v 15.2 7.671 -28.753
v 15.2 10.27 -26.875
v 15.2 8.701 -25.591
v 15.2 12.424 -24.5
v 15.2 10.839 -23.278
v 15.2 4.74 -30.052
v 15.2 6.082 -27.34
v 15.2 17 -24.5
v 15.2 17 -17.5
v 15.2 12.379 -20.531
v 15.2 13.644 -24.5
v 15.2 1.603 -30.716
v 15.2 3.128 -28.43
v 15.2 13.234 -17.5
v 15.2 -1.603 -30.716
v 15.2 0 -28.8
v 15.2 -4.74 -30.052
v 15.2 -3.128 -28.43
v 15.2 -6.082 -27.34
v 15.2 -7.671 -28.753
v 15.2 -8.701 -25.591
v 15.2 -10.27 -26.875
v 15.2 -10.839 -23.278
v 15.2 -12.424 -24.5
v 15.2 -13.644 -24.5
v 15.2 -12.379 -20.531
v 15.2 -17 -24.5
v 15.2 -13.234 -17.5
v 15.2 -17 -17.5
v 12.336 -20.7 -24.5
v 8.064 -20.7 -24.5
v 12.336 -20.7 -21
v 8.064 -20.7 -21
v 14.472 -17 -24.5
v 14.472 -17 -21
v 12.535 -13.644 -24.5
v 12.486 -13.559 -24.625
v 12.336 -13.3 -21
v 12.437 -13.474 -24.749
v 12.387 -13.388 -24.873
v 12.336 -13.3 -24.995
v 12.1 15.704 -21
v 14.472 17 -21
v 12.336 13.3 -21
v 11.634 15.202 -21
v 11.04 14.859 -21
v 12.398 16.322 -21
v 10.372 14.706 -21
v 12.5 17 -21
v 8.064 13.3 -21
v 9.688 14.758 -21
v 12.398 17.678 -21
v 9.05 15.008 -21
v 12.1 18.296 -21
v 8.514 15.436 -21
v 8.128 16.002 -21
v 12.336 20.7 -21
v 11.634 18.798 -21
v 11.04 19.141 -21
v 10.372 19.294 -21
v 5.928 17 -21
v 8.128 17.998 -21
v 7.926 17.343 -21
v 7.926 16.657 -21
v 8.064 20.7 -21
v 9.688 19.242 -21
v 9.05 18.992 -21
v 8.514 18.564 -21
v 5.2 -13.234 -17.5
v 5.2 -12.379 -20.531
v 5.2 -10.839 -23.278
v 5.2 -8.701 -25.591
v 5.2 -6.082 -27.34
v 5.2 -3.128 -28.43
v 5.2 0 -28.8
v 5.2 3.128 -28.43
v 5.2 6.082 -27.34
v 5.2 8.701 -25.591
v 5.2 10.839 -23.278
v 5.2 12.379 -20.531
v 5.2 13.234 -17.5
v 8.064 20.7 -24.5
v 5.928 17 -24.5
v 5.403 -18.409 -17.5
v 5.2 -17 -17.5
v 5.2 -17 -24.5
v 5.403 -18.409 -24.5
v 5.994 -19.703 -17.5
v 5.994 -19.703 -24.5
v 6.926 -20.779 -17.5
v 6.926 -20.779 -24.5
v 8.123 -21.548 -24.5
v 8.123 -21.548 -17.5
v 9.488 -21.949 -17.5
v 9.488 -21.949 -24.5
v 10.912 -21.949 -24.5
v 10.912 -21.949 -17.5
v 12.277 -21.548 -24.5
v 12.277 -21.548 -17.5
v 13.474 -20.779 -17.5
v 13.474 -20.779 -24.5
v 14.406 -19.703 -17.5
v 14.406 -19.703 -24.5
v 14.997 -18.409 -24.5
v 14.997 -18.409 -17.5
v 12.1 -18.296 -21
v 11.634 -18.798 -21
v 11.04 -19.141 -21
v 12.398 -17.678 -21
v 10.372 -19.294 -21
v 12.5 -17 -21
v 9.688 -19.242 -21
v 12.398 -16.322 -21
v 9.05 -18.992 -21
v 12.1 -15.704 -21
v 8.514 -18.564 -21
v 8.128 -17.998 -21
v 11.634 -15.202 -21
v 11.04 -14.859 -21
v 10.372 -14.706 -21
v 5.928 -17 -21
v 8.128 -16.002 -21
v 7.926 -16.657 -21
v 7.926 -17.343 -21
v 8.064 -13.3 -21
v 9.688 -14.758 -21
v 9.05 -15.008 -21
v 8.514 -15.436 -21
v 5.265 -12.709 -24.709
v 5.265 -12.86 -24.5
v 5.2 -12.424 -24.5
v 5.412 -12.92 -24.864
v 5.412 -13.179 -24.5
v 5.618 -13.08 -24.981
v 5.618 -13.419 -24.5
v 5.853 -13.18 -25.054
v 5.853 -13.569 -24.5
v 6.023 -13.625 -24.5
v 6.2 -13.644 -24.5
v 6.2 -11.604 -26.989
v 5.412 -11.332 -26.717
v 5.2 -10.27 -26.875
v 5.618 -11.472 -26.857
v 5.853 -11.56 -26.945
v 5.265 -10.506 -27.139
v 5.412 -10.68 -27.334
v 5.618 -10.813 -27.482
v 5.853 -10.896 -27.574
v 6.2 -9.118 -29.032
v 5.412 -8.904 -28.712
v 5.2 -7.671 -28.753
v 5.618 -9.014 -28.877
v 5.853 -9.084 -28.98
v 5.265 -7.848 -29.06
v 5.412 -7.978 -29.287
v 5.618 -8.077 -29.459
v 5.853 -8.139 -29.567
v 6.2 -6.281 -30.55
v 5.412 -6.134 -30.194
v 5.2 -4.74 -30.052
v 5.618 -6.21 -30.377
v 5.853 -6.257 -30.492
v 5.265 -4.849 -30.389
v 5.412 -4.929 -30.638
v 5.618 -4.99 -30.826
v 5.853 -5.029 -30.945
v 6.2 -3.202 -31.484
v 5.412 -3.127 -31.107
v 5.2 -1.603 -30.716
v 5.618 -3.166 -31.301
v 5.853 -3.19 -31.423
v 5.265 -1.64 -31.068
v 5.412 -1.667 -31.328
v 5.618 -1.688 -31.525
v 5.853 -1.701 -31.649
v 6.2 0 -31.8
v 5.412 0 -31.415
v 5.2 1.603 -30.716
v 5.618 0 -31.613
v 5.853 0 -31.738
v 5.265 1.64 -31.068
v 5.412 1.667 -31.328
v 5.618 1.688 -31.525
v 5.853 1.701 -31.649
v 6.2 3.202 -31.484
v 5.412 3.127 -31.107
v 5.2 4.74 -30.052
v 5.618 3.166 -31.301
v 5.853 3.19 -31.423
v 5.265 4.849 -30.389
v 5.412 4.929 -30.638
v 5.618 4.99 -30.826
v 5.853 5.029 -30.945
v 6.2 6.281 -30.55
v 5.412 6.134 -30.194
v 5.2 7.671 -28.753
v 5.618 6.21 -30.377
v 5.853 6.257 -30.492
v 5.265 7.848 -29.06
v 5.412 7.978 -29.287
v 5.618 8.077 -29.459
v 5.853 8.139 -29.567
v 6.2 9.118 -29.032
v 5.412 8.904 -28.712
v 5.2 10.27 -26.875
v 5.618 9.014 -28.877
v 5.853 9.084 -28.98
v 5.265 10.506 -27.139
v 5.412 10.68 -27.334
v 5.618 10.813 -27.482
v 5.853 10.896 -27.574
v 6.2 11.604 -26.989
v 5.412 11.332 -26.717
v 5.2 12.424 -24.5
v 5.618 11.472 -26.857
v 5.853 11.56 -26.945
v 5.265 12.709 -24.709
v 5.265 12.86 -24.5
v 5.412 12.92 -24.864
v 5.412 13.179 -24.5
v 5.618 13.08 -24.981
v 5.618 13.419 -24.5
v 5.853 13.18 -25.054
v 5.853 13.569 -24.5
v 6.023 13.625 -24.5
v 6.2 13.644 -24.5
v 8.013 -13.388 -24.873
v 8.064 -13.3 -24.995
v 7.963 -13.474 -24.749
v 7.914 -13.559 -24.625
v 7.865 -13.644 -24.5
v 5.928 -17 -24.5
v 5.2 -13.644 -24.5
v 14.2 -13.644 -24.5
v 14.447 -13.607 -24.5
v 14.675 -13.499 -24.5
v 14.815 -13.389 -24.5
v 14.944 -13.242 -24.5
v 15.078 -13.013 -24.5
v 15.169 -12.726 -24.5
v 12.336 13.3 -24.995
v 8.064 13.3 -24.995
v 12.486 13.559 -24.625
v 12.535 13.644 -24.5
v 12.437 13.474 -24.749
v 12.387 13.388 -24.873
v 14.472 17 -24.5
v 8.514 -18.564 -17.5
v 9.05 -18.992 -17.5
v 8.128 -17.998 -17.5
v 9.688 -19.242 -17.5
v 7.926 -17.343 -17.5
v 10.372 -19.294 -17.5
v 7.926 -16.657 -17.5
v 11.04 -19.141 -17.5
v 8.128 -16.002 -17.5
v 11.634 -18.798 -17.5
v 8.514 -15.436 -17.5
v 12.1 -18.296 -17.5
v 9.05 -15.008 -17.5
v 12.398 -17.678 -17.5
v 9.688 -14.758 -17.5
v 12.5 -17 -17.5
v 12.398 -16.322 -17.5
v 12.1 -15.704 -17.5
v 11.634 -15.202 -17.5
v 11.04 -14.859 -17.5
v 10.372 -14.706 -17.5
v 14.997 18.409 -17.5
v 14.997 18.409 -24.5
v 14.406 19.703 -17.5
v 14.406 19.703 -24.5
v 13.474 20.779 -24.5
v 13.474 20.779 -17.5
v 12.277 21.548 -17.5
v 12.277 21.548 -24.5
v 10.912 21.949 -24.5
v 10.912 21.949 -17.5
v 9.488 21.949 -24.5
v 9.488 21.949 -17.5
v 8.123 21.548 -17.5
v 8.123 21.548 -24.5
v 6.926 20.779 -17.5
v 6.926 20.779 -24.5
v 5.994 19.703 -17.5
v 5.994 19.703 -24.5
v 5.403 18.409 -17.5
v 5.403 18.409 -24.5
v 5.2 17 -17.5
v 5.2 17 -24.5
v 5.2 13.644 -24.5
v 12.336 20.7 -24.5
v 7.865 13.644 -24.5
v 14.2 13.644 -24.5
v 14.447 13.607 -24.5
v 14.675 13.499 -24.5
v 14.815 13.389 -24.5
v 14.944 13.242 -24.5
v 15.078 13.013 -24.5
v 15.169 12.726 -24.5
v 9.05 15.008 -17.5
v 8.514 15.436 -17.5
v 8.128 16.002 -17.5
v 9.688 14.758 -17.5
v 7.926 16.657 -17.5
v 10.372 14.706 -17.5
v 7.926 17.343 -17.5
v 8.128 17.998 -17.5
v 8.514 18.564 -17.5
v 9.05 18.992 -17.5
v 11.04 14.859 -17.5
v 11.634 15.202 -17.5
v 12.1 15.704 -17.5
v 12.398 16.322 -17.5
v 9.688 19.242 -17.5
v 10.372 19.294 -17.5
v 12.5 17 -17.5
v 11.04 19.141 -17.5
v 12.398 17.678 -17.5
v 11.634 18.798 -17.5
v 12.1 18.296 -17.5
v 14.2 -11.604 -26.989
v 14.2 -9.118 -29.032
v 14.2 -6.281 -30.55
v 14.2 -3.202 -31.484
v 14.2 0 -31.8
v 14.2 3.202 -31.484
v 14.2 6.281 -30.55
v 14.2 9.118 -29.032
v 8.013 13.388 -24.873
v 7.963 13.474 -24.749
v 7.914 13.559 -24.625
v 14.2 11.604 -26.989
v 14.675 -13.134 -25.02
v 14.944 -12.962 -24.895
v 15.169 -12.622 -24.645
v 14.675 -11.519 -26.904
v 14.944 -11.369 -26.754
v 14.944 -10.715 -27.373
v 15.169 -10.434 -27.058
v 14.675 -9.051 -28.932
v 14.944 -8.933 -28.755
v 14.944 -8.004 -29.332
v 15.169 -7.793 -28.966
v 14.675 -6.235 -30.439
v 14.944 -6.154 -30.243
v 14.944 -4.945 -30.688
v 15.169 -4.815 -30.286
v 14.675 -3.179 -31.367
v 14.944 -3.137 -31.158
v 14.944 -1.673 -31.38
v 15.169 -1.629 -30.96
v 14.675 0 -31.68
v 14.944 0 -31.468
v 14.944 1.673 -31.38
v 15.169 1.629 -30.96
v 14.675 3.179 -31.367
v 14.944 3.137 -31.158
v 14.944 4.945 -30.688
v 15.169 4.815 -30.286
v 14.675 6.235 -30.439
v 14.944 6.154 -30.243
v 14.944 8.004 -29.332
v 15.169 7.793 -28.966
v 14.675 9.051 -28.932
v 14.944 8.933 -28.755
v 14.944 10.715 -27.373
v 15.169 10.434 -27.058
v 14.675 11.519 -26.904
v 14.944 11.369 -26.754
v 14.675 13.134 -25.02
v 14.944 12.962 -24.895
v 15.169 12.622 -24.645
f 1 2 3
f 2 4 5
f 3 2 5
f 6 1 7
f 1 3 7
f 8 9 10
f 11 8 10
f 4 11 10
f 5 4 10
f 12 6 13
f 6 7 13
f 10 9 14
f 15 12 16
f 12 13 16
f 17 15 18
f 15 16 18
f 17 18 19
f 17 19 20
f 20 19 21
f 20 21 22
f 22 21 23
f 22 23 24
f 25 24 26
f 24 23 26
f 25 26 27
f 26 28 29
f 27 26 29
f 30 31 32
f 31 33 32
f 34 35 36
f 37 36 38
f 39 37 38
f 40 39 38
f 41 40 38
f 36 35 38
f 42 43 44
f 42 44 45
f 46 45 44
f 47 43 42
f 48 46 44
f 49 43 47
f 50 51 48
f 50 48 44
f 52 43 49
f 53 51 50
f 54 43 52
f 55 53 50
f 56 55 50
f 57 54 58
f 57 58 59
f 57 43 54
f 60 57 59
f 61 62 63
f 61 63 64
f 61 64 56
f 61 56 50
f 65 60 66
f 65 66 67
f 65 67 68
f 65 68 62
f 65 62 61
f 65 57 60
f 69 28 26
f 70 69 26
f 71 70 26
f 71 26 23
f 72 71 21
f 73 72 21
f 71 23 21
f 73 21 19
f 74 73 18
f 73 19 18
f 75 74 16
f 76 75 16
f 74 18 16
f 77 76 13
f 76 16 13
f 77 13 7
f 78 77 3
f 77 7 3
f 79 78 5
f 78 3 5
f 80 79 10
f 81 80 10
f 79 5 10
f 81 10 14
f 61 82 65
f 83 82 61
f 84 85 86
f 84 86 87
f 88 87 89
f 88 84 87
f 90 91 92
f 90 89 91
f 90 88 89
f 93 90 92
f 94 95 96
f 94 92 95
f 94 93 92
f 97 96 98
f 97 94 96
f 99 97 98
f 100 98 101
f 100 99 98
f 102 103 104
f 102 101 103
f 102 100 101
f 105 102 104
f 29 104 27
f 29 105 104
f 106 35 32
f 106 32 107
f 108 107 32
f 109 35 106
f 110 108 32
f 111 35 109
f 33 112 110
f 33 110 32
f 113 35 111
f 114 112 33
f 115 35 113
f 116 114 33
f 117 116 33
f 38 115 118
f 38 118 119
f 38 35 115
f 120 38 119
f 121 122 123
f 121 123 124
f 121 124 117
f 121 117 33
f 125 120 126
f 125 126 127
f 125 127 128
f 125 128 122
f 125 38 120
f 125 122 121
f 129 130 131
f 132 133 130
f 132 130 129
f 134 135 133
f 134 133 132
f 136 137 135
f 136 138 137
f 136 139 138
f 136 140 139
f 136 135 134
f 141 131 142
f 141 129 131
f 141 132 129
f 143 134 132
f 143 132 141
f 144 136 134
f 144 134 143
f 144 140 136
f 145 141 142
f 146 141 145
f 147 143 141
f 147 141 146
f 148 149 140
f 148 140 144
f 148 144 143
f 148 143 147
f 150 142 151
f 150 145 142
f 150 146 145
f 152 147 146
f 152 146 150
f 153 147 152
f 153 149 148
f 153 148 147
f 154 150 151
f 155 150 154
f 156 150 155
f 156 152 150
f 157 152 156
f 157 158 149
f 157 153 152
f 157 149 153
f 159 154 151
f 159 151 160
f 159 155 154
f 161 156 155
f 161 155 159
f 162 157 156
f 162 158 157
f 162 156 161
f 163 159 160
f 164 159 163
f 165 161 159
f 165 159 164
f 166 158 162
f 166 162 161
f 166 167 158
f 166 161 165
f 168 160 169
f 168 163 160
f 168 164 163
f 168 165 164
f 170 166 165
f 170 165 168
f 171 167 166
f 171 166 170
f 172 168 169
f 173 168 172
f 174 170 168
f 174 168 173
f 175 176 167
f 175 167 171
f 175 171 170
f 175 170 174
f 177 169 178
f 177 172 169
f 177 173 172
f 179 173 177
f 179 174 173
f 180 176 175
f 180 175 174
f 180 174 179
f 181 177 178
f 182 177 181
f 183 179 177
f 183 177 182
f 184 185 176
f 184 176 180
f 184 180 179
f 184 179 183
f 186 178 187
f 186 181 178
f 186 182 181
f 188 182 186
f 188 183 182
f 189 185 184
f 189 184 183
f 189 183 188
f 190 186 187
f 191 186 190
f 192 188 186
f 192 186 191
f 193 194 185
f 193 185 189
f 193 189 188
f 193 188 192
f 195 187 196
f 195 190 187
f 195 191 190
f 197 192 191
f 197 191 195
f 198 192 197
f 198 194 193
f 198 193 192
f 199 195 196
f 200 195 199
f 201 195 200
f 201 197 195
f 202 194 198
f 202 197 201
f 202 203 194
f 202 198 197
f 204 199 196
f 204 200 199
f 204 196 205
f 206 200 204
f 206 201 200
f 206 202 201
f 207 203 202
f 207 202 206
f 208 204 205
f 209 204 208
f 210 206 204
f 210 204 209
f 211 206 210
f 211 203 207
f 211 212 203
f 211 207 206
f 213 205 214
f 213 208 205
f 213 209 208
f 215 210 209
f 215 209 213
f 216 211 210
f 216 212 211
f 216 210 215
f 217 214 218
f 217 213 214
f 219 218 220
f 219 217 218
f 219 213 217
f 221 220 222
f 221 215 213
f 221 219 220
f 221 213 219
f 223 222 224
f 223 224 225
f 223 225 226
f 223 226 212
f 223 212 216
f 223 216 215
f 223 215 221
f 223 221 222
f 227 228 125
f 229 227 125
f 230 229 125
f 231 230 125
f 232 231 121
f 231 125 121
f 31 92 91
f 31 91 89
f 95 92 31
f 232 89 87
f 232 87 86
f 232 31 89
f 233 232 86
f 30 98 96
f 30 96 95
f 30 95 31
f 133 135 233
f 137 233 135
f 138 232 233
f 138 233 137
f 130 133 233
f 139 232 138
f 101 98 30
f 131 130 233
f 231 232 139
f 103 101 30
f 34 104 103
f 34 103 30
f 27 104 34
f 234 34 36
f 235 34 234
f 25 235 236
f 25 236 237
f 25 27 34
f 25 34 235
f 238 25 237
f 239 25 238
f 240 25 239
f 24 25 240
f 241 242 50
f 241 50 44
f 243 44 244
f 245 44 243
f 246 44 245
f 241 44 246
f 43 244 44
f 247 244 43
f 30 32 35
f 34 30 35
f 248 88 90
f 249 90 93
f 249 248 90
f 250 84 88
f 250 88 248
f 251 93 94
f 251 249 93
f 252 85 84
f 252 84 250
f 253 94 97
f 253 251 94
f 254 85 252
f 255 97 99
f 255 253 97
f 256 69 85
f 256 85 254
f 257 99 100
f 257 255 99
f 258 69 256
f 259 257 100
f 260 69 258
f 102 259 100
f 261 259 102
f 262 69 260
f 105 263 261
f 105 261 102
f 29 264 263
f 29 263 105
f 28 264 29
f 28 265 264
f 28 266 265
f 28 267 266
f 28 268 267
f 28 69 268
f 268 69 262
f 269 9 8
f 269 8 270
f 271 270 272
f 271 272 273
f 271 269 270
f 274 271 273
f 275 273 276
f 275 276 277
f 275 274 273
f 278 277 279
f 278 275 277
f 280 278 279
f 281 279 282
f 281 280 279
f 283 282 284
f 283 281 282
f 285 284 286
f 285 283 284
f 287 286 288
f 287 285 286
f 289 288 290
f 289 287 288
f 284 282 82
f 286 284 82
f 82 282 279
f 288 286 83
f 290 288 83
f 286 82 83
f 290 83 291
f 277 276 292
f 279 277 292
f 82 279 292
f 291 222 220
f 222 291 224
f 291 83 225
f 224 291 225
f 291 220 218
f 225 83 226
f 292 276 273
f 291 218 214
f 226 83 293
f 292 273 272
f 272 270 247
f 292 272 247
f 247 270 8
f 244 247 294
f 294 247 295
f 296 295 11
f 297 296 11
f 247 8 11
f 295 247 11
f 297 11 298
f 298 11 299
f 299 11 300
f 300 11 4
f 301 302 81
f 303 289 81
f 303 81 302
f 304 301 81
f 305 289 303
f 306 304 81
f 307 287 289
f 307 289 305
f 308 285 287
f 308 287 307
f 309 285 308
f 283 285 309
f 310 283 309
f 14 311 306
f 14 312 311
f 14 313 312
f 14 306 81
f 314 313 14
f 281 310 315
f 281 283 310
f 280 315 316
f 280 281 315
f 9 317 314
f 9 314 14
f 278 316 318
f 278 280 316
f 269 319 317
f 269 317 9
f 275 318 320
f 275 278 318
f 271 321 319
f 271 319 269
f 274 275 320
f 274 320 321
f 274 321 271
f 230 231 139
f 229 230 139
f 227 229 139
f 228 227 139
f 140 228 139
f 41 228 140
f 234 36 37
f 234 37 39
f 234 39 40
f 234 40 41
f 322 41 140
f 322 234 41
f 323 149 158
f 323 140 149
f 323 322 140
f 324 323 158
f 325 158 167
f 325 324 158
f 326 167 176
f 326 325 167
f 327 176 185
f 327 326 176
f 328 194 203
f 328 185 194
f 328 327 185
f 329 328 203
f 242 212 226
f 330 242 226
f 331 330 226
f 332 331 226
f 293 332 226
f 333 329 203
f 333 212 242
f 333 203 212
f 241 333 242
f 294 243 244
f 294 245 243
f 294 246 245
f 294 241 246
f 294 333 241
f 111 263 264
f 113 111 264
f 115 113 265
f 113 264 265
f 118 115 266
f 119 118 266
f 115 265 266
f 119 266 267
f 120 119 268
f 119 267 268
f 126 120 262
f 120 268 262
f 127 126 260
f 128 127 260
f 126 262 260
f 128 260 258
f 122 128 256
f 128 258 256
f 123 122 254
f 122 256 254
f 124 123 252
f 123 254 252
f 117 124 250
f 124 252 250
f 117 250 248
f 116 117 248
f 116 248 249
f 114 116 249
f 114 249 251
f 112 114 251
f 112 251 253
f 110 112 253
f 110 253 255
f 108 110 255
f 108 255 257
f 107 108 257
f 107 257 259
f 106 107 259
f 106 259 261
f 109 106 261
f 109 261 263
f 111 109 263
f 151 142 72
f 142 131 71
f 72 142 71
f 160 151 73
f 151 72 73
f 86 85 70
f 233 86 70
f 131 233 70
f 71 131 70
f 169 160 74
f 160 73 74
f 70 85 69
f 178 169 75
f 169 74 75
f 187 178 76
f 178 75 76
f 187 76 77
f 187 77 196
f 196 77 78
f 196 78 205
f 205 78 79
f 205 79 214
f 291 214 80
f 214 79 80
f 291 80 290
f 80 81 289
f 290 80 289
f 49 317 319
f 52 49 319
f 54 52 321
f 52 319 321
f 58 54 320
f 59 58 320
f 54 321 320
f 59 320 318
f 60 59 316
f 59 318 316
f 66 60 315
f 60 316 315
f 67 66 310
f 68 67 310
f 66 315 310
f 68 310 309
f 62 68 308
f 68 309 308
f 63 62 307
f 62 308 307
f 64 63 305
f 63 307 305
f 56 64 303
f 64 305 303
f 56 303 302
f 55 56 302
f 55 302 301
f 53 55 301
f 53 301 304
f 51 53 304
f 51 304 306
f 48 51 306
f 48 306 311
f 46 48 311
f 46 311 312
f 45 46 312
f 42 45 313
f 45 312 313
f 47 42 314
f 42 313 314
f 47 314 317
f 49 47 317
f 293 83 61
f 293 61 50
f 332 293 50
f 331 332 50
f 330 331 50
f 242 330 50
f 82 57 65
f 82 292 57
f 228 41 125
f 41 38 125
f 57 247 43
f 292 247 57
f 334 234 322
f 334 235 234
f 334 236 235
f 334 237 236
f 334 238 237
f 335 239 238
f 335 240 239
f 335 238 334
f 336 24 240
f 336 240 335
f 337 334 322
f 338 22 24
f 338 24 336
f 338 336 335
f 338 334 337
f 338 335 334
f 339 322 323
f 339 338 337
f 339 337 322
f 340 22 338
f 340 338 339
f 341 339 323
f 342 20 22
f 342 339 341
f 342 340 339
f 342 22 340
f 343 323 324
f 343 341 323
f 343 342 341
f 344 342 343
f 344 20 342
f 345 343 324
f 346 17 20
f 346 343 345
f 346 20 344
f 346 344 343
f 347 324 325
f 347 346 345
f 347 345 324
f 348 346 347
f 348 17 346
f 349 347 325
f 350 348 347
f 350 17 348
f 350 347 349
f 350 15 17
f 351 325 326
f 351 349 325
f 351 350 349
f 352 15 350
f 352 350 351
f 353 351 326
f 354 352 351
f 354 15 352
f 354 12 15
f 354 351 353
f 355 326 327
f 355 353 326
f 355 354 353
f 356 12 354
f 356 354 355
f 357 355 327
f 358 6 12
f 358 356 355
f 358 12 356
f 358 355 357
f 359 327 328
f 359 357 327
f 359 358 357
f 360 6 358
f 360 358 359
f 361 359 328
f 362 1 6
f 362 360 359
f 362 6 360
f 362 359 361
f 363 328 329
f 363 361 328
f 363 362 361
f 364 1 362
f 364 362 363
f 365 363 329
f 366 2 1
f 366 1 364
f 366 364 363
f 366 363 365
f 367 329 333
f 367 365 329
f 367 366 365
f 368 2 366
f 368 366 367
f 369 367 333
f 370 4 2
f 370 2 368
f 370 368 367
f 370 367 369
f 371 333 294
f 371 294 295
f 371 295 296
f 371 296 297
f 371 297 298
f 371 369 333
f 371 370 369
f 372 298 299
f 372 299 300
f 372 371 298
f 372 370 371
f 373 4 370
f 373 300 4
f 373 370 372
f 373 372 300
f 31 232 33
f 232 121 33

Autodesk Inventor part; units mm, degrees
ref_plane "YZ Plane" through (0, 0, 0) normal (1, 0, 0) x (0, 1, 0)
ref_plane "XZ Plane" through (0, 0, 0) normal (0, 1, 0) x (-1, 0, 0)
ref_plane "Arbeitsebene1" through (0, 0, -17.5) normal (0, 0, 1) x (1, 0, 0)
sketch "Skizze1" plane through (0, 0, -17.5) normal (0, 0, 1) x (1, 0, 0)
  arc A0 (5.2, -17) -> (15.2, -17) centre (10.2, -17) ccw
  circle A1 centre (10.2, -17) radius 2.3
  circle A2 centre (10.2, 17) radius 2.3
  arc A3 (15.2, 17) -> (5.2, 17) centre (10.2, 17) ccw
  line L0 (15.2, 17) -> (15.2, -17)
  line L1 (5.2, -17) -> (5.2, 17)
  point P0 (0, 0)
  dimension "d17" = 34
  dimension "d19" = 5
  dimension "d20" = 5
  dimension "d21" = 4.6
  dimension "d22" = 4.6
  dimension "d23" = 5.2
  dimension "d24" = 15.2
  dimension "d25" = 17
extrude "Extrusion1" add sketch "Skizze1" against normal blind 20
sketch "Skizze2" plane through (15.2, -17, -17.5) normal (1, 0, 0) x (0, 0, -1)
  circle A0 centre (-2.1, 17) radius 13.4
  circle A1 centre (-2.1, 17) radius 16.4
  line L0 (0, 39) -> (20, 39) projected
  line L1 (7, 39) -> (7, 30.6437)
  line L2 (7, 39) -> (-2.3022, 41.2587)
  line L3 (-2.3022, 41.2587) -> (-4.5237, 40.7441)
  line L4 (-4.5237, 40.7441) -> (-5.04, 30.0735)
  line L5 (-5.1067, 3.9417) -> (-12.3463, -18.8233)
  line L6 (-12.3463, -18.8233) -> (7.5061, -24.3836)
  line L7 (7.5061, -24.3836) -> (7, -5)
  line L8 (0, -5) -> (20, -5) projected
  line L9 (7, -5) -> (7, 3.3563)
  line L10 (0, 0) -> (0, -5) projected
  line L11 (36.0228, 70.8555) -> (-22.3921, 70.8555)
  line L12 (-22.3921, 70.8555) -> (-22.3921, -28.3632)
  line L13 (-22.3921, -28.3632) -> (36.0228, -28.3632)
  line L14 (36.0228, -28.3632) -> (36.0228, 70.8555)
  point P0 (-17.5, 17)
  point P1 (-6.0183, 1.075)
  point P2 (-4.8906, 33.1608)
  dimension "d5" = 3
  dimension "d6" = 7
  dimension "d26" = 44
  dimension "d27" = 22
  dimension "d28" = 26.8
  dimension "d29" = 15.4
extrude "Extrusion2" cut sketch "Skizze2" against normal blind 10 contours A0 | L14 L13 L12 L11
sketch "Skizze3" plane through (15.2, -17, -24.5) normal (0, 0, -1) x (-1, 0, 0)
  circle A0 centre (5, 34) radius 2.3 projected
  line L0 (2.8638, 30.3) -> (0.7276, 34)
  line L1 (0.7276, 34) -> (2.8638, 37.7)
  line L2 (2.8638, 37.7) -> (7.1362, 37.7)
  line L3 (7.1362, 37.7) -> (9.2724, 34)
  line L4 (9.2724, 34) -> (7.1362, 30.3)
  line L5 (7.1362, 30.3) -> (2.8638, 30.3)
  line L6 (0.7276, 0) -> (2.8638, 3.7)
  line L7 (2.8638, 3.7) -> (7.1362, 3.7)
  line L8 (7.1362, 3.7) -> (9.2724, 0)
  line L9 (9.2724, 0) -> (7.1362, -3.7)
  line L10 (7.1362, -3.7) -> (2.8638, -3.7)
  line L11 (2.8638, -3.7) -> (0.7276, 0)
  point P0 (15.2, 17)
  point P1 (5, 0)
  point P2 (5, 0)
  point P3 (5.6446, 34.7922)
  point P4 (4.3554, 34.7922)
  dimension "d9" = 7.4
  dimension "d10" = 7.4
extrude "Extrusion3" cut sketch "Skizze3" along normal blind 10 and the other way blind 3.5 contours A0 | L0 L1 L2 L3 L4 L5 | L6 L7 L8 L9 L10 L11
fillet "Rundung1" radius 1 2 edges at (15.2, 0, -31.8) (5.2, 0, -31.8)
equation "\"d20\" = d19"
equation "\"d27\" = 0.5 * d26"
equation "\"d10\" = d9"
properties part number "Bracket26_8"
